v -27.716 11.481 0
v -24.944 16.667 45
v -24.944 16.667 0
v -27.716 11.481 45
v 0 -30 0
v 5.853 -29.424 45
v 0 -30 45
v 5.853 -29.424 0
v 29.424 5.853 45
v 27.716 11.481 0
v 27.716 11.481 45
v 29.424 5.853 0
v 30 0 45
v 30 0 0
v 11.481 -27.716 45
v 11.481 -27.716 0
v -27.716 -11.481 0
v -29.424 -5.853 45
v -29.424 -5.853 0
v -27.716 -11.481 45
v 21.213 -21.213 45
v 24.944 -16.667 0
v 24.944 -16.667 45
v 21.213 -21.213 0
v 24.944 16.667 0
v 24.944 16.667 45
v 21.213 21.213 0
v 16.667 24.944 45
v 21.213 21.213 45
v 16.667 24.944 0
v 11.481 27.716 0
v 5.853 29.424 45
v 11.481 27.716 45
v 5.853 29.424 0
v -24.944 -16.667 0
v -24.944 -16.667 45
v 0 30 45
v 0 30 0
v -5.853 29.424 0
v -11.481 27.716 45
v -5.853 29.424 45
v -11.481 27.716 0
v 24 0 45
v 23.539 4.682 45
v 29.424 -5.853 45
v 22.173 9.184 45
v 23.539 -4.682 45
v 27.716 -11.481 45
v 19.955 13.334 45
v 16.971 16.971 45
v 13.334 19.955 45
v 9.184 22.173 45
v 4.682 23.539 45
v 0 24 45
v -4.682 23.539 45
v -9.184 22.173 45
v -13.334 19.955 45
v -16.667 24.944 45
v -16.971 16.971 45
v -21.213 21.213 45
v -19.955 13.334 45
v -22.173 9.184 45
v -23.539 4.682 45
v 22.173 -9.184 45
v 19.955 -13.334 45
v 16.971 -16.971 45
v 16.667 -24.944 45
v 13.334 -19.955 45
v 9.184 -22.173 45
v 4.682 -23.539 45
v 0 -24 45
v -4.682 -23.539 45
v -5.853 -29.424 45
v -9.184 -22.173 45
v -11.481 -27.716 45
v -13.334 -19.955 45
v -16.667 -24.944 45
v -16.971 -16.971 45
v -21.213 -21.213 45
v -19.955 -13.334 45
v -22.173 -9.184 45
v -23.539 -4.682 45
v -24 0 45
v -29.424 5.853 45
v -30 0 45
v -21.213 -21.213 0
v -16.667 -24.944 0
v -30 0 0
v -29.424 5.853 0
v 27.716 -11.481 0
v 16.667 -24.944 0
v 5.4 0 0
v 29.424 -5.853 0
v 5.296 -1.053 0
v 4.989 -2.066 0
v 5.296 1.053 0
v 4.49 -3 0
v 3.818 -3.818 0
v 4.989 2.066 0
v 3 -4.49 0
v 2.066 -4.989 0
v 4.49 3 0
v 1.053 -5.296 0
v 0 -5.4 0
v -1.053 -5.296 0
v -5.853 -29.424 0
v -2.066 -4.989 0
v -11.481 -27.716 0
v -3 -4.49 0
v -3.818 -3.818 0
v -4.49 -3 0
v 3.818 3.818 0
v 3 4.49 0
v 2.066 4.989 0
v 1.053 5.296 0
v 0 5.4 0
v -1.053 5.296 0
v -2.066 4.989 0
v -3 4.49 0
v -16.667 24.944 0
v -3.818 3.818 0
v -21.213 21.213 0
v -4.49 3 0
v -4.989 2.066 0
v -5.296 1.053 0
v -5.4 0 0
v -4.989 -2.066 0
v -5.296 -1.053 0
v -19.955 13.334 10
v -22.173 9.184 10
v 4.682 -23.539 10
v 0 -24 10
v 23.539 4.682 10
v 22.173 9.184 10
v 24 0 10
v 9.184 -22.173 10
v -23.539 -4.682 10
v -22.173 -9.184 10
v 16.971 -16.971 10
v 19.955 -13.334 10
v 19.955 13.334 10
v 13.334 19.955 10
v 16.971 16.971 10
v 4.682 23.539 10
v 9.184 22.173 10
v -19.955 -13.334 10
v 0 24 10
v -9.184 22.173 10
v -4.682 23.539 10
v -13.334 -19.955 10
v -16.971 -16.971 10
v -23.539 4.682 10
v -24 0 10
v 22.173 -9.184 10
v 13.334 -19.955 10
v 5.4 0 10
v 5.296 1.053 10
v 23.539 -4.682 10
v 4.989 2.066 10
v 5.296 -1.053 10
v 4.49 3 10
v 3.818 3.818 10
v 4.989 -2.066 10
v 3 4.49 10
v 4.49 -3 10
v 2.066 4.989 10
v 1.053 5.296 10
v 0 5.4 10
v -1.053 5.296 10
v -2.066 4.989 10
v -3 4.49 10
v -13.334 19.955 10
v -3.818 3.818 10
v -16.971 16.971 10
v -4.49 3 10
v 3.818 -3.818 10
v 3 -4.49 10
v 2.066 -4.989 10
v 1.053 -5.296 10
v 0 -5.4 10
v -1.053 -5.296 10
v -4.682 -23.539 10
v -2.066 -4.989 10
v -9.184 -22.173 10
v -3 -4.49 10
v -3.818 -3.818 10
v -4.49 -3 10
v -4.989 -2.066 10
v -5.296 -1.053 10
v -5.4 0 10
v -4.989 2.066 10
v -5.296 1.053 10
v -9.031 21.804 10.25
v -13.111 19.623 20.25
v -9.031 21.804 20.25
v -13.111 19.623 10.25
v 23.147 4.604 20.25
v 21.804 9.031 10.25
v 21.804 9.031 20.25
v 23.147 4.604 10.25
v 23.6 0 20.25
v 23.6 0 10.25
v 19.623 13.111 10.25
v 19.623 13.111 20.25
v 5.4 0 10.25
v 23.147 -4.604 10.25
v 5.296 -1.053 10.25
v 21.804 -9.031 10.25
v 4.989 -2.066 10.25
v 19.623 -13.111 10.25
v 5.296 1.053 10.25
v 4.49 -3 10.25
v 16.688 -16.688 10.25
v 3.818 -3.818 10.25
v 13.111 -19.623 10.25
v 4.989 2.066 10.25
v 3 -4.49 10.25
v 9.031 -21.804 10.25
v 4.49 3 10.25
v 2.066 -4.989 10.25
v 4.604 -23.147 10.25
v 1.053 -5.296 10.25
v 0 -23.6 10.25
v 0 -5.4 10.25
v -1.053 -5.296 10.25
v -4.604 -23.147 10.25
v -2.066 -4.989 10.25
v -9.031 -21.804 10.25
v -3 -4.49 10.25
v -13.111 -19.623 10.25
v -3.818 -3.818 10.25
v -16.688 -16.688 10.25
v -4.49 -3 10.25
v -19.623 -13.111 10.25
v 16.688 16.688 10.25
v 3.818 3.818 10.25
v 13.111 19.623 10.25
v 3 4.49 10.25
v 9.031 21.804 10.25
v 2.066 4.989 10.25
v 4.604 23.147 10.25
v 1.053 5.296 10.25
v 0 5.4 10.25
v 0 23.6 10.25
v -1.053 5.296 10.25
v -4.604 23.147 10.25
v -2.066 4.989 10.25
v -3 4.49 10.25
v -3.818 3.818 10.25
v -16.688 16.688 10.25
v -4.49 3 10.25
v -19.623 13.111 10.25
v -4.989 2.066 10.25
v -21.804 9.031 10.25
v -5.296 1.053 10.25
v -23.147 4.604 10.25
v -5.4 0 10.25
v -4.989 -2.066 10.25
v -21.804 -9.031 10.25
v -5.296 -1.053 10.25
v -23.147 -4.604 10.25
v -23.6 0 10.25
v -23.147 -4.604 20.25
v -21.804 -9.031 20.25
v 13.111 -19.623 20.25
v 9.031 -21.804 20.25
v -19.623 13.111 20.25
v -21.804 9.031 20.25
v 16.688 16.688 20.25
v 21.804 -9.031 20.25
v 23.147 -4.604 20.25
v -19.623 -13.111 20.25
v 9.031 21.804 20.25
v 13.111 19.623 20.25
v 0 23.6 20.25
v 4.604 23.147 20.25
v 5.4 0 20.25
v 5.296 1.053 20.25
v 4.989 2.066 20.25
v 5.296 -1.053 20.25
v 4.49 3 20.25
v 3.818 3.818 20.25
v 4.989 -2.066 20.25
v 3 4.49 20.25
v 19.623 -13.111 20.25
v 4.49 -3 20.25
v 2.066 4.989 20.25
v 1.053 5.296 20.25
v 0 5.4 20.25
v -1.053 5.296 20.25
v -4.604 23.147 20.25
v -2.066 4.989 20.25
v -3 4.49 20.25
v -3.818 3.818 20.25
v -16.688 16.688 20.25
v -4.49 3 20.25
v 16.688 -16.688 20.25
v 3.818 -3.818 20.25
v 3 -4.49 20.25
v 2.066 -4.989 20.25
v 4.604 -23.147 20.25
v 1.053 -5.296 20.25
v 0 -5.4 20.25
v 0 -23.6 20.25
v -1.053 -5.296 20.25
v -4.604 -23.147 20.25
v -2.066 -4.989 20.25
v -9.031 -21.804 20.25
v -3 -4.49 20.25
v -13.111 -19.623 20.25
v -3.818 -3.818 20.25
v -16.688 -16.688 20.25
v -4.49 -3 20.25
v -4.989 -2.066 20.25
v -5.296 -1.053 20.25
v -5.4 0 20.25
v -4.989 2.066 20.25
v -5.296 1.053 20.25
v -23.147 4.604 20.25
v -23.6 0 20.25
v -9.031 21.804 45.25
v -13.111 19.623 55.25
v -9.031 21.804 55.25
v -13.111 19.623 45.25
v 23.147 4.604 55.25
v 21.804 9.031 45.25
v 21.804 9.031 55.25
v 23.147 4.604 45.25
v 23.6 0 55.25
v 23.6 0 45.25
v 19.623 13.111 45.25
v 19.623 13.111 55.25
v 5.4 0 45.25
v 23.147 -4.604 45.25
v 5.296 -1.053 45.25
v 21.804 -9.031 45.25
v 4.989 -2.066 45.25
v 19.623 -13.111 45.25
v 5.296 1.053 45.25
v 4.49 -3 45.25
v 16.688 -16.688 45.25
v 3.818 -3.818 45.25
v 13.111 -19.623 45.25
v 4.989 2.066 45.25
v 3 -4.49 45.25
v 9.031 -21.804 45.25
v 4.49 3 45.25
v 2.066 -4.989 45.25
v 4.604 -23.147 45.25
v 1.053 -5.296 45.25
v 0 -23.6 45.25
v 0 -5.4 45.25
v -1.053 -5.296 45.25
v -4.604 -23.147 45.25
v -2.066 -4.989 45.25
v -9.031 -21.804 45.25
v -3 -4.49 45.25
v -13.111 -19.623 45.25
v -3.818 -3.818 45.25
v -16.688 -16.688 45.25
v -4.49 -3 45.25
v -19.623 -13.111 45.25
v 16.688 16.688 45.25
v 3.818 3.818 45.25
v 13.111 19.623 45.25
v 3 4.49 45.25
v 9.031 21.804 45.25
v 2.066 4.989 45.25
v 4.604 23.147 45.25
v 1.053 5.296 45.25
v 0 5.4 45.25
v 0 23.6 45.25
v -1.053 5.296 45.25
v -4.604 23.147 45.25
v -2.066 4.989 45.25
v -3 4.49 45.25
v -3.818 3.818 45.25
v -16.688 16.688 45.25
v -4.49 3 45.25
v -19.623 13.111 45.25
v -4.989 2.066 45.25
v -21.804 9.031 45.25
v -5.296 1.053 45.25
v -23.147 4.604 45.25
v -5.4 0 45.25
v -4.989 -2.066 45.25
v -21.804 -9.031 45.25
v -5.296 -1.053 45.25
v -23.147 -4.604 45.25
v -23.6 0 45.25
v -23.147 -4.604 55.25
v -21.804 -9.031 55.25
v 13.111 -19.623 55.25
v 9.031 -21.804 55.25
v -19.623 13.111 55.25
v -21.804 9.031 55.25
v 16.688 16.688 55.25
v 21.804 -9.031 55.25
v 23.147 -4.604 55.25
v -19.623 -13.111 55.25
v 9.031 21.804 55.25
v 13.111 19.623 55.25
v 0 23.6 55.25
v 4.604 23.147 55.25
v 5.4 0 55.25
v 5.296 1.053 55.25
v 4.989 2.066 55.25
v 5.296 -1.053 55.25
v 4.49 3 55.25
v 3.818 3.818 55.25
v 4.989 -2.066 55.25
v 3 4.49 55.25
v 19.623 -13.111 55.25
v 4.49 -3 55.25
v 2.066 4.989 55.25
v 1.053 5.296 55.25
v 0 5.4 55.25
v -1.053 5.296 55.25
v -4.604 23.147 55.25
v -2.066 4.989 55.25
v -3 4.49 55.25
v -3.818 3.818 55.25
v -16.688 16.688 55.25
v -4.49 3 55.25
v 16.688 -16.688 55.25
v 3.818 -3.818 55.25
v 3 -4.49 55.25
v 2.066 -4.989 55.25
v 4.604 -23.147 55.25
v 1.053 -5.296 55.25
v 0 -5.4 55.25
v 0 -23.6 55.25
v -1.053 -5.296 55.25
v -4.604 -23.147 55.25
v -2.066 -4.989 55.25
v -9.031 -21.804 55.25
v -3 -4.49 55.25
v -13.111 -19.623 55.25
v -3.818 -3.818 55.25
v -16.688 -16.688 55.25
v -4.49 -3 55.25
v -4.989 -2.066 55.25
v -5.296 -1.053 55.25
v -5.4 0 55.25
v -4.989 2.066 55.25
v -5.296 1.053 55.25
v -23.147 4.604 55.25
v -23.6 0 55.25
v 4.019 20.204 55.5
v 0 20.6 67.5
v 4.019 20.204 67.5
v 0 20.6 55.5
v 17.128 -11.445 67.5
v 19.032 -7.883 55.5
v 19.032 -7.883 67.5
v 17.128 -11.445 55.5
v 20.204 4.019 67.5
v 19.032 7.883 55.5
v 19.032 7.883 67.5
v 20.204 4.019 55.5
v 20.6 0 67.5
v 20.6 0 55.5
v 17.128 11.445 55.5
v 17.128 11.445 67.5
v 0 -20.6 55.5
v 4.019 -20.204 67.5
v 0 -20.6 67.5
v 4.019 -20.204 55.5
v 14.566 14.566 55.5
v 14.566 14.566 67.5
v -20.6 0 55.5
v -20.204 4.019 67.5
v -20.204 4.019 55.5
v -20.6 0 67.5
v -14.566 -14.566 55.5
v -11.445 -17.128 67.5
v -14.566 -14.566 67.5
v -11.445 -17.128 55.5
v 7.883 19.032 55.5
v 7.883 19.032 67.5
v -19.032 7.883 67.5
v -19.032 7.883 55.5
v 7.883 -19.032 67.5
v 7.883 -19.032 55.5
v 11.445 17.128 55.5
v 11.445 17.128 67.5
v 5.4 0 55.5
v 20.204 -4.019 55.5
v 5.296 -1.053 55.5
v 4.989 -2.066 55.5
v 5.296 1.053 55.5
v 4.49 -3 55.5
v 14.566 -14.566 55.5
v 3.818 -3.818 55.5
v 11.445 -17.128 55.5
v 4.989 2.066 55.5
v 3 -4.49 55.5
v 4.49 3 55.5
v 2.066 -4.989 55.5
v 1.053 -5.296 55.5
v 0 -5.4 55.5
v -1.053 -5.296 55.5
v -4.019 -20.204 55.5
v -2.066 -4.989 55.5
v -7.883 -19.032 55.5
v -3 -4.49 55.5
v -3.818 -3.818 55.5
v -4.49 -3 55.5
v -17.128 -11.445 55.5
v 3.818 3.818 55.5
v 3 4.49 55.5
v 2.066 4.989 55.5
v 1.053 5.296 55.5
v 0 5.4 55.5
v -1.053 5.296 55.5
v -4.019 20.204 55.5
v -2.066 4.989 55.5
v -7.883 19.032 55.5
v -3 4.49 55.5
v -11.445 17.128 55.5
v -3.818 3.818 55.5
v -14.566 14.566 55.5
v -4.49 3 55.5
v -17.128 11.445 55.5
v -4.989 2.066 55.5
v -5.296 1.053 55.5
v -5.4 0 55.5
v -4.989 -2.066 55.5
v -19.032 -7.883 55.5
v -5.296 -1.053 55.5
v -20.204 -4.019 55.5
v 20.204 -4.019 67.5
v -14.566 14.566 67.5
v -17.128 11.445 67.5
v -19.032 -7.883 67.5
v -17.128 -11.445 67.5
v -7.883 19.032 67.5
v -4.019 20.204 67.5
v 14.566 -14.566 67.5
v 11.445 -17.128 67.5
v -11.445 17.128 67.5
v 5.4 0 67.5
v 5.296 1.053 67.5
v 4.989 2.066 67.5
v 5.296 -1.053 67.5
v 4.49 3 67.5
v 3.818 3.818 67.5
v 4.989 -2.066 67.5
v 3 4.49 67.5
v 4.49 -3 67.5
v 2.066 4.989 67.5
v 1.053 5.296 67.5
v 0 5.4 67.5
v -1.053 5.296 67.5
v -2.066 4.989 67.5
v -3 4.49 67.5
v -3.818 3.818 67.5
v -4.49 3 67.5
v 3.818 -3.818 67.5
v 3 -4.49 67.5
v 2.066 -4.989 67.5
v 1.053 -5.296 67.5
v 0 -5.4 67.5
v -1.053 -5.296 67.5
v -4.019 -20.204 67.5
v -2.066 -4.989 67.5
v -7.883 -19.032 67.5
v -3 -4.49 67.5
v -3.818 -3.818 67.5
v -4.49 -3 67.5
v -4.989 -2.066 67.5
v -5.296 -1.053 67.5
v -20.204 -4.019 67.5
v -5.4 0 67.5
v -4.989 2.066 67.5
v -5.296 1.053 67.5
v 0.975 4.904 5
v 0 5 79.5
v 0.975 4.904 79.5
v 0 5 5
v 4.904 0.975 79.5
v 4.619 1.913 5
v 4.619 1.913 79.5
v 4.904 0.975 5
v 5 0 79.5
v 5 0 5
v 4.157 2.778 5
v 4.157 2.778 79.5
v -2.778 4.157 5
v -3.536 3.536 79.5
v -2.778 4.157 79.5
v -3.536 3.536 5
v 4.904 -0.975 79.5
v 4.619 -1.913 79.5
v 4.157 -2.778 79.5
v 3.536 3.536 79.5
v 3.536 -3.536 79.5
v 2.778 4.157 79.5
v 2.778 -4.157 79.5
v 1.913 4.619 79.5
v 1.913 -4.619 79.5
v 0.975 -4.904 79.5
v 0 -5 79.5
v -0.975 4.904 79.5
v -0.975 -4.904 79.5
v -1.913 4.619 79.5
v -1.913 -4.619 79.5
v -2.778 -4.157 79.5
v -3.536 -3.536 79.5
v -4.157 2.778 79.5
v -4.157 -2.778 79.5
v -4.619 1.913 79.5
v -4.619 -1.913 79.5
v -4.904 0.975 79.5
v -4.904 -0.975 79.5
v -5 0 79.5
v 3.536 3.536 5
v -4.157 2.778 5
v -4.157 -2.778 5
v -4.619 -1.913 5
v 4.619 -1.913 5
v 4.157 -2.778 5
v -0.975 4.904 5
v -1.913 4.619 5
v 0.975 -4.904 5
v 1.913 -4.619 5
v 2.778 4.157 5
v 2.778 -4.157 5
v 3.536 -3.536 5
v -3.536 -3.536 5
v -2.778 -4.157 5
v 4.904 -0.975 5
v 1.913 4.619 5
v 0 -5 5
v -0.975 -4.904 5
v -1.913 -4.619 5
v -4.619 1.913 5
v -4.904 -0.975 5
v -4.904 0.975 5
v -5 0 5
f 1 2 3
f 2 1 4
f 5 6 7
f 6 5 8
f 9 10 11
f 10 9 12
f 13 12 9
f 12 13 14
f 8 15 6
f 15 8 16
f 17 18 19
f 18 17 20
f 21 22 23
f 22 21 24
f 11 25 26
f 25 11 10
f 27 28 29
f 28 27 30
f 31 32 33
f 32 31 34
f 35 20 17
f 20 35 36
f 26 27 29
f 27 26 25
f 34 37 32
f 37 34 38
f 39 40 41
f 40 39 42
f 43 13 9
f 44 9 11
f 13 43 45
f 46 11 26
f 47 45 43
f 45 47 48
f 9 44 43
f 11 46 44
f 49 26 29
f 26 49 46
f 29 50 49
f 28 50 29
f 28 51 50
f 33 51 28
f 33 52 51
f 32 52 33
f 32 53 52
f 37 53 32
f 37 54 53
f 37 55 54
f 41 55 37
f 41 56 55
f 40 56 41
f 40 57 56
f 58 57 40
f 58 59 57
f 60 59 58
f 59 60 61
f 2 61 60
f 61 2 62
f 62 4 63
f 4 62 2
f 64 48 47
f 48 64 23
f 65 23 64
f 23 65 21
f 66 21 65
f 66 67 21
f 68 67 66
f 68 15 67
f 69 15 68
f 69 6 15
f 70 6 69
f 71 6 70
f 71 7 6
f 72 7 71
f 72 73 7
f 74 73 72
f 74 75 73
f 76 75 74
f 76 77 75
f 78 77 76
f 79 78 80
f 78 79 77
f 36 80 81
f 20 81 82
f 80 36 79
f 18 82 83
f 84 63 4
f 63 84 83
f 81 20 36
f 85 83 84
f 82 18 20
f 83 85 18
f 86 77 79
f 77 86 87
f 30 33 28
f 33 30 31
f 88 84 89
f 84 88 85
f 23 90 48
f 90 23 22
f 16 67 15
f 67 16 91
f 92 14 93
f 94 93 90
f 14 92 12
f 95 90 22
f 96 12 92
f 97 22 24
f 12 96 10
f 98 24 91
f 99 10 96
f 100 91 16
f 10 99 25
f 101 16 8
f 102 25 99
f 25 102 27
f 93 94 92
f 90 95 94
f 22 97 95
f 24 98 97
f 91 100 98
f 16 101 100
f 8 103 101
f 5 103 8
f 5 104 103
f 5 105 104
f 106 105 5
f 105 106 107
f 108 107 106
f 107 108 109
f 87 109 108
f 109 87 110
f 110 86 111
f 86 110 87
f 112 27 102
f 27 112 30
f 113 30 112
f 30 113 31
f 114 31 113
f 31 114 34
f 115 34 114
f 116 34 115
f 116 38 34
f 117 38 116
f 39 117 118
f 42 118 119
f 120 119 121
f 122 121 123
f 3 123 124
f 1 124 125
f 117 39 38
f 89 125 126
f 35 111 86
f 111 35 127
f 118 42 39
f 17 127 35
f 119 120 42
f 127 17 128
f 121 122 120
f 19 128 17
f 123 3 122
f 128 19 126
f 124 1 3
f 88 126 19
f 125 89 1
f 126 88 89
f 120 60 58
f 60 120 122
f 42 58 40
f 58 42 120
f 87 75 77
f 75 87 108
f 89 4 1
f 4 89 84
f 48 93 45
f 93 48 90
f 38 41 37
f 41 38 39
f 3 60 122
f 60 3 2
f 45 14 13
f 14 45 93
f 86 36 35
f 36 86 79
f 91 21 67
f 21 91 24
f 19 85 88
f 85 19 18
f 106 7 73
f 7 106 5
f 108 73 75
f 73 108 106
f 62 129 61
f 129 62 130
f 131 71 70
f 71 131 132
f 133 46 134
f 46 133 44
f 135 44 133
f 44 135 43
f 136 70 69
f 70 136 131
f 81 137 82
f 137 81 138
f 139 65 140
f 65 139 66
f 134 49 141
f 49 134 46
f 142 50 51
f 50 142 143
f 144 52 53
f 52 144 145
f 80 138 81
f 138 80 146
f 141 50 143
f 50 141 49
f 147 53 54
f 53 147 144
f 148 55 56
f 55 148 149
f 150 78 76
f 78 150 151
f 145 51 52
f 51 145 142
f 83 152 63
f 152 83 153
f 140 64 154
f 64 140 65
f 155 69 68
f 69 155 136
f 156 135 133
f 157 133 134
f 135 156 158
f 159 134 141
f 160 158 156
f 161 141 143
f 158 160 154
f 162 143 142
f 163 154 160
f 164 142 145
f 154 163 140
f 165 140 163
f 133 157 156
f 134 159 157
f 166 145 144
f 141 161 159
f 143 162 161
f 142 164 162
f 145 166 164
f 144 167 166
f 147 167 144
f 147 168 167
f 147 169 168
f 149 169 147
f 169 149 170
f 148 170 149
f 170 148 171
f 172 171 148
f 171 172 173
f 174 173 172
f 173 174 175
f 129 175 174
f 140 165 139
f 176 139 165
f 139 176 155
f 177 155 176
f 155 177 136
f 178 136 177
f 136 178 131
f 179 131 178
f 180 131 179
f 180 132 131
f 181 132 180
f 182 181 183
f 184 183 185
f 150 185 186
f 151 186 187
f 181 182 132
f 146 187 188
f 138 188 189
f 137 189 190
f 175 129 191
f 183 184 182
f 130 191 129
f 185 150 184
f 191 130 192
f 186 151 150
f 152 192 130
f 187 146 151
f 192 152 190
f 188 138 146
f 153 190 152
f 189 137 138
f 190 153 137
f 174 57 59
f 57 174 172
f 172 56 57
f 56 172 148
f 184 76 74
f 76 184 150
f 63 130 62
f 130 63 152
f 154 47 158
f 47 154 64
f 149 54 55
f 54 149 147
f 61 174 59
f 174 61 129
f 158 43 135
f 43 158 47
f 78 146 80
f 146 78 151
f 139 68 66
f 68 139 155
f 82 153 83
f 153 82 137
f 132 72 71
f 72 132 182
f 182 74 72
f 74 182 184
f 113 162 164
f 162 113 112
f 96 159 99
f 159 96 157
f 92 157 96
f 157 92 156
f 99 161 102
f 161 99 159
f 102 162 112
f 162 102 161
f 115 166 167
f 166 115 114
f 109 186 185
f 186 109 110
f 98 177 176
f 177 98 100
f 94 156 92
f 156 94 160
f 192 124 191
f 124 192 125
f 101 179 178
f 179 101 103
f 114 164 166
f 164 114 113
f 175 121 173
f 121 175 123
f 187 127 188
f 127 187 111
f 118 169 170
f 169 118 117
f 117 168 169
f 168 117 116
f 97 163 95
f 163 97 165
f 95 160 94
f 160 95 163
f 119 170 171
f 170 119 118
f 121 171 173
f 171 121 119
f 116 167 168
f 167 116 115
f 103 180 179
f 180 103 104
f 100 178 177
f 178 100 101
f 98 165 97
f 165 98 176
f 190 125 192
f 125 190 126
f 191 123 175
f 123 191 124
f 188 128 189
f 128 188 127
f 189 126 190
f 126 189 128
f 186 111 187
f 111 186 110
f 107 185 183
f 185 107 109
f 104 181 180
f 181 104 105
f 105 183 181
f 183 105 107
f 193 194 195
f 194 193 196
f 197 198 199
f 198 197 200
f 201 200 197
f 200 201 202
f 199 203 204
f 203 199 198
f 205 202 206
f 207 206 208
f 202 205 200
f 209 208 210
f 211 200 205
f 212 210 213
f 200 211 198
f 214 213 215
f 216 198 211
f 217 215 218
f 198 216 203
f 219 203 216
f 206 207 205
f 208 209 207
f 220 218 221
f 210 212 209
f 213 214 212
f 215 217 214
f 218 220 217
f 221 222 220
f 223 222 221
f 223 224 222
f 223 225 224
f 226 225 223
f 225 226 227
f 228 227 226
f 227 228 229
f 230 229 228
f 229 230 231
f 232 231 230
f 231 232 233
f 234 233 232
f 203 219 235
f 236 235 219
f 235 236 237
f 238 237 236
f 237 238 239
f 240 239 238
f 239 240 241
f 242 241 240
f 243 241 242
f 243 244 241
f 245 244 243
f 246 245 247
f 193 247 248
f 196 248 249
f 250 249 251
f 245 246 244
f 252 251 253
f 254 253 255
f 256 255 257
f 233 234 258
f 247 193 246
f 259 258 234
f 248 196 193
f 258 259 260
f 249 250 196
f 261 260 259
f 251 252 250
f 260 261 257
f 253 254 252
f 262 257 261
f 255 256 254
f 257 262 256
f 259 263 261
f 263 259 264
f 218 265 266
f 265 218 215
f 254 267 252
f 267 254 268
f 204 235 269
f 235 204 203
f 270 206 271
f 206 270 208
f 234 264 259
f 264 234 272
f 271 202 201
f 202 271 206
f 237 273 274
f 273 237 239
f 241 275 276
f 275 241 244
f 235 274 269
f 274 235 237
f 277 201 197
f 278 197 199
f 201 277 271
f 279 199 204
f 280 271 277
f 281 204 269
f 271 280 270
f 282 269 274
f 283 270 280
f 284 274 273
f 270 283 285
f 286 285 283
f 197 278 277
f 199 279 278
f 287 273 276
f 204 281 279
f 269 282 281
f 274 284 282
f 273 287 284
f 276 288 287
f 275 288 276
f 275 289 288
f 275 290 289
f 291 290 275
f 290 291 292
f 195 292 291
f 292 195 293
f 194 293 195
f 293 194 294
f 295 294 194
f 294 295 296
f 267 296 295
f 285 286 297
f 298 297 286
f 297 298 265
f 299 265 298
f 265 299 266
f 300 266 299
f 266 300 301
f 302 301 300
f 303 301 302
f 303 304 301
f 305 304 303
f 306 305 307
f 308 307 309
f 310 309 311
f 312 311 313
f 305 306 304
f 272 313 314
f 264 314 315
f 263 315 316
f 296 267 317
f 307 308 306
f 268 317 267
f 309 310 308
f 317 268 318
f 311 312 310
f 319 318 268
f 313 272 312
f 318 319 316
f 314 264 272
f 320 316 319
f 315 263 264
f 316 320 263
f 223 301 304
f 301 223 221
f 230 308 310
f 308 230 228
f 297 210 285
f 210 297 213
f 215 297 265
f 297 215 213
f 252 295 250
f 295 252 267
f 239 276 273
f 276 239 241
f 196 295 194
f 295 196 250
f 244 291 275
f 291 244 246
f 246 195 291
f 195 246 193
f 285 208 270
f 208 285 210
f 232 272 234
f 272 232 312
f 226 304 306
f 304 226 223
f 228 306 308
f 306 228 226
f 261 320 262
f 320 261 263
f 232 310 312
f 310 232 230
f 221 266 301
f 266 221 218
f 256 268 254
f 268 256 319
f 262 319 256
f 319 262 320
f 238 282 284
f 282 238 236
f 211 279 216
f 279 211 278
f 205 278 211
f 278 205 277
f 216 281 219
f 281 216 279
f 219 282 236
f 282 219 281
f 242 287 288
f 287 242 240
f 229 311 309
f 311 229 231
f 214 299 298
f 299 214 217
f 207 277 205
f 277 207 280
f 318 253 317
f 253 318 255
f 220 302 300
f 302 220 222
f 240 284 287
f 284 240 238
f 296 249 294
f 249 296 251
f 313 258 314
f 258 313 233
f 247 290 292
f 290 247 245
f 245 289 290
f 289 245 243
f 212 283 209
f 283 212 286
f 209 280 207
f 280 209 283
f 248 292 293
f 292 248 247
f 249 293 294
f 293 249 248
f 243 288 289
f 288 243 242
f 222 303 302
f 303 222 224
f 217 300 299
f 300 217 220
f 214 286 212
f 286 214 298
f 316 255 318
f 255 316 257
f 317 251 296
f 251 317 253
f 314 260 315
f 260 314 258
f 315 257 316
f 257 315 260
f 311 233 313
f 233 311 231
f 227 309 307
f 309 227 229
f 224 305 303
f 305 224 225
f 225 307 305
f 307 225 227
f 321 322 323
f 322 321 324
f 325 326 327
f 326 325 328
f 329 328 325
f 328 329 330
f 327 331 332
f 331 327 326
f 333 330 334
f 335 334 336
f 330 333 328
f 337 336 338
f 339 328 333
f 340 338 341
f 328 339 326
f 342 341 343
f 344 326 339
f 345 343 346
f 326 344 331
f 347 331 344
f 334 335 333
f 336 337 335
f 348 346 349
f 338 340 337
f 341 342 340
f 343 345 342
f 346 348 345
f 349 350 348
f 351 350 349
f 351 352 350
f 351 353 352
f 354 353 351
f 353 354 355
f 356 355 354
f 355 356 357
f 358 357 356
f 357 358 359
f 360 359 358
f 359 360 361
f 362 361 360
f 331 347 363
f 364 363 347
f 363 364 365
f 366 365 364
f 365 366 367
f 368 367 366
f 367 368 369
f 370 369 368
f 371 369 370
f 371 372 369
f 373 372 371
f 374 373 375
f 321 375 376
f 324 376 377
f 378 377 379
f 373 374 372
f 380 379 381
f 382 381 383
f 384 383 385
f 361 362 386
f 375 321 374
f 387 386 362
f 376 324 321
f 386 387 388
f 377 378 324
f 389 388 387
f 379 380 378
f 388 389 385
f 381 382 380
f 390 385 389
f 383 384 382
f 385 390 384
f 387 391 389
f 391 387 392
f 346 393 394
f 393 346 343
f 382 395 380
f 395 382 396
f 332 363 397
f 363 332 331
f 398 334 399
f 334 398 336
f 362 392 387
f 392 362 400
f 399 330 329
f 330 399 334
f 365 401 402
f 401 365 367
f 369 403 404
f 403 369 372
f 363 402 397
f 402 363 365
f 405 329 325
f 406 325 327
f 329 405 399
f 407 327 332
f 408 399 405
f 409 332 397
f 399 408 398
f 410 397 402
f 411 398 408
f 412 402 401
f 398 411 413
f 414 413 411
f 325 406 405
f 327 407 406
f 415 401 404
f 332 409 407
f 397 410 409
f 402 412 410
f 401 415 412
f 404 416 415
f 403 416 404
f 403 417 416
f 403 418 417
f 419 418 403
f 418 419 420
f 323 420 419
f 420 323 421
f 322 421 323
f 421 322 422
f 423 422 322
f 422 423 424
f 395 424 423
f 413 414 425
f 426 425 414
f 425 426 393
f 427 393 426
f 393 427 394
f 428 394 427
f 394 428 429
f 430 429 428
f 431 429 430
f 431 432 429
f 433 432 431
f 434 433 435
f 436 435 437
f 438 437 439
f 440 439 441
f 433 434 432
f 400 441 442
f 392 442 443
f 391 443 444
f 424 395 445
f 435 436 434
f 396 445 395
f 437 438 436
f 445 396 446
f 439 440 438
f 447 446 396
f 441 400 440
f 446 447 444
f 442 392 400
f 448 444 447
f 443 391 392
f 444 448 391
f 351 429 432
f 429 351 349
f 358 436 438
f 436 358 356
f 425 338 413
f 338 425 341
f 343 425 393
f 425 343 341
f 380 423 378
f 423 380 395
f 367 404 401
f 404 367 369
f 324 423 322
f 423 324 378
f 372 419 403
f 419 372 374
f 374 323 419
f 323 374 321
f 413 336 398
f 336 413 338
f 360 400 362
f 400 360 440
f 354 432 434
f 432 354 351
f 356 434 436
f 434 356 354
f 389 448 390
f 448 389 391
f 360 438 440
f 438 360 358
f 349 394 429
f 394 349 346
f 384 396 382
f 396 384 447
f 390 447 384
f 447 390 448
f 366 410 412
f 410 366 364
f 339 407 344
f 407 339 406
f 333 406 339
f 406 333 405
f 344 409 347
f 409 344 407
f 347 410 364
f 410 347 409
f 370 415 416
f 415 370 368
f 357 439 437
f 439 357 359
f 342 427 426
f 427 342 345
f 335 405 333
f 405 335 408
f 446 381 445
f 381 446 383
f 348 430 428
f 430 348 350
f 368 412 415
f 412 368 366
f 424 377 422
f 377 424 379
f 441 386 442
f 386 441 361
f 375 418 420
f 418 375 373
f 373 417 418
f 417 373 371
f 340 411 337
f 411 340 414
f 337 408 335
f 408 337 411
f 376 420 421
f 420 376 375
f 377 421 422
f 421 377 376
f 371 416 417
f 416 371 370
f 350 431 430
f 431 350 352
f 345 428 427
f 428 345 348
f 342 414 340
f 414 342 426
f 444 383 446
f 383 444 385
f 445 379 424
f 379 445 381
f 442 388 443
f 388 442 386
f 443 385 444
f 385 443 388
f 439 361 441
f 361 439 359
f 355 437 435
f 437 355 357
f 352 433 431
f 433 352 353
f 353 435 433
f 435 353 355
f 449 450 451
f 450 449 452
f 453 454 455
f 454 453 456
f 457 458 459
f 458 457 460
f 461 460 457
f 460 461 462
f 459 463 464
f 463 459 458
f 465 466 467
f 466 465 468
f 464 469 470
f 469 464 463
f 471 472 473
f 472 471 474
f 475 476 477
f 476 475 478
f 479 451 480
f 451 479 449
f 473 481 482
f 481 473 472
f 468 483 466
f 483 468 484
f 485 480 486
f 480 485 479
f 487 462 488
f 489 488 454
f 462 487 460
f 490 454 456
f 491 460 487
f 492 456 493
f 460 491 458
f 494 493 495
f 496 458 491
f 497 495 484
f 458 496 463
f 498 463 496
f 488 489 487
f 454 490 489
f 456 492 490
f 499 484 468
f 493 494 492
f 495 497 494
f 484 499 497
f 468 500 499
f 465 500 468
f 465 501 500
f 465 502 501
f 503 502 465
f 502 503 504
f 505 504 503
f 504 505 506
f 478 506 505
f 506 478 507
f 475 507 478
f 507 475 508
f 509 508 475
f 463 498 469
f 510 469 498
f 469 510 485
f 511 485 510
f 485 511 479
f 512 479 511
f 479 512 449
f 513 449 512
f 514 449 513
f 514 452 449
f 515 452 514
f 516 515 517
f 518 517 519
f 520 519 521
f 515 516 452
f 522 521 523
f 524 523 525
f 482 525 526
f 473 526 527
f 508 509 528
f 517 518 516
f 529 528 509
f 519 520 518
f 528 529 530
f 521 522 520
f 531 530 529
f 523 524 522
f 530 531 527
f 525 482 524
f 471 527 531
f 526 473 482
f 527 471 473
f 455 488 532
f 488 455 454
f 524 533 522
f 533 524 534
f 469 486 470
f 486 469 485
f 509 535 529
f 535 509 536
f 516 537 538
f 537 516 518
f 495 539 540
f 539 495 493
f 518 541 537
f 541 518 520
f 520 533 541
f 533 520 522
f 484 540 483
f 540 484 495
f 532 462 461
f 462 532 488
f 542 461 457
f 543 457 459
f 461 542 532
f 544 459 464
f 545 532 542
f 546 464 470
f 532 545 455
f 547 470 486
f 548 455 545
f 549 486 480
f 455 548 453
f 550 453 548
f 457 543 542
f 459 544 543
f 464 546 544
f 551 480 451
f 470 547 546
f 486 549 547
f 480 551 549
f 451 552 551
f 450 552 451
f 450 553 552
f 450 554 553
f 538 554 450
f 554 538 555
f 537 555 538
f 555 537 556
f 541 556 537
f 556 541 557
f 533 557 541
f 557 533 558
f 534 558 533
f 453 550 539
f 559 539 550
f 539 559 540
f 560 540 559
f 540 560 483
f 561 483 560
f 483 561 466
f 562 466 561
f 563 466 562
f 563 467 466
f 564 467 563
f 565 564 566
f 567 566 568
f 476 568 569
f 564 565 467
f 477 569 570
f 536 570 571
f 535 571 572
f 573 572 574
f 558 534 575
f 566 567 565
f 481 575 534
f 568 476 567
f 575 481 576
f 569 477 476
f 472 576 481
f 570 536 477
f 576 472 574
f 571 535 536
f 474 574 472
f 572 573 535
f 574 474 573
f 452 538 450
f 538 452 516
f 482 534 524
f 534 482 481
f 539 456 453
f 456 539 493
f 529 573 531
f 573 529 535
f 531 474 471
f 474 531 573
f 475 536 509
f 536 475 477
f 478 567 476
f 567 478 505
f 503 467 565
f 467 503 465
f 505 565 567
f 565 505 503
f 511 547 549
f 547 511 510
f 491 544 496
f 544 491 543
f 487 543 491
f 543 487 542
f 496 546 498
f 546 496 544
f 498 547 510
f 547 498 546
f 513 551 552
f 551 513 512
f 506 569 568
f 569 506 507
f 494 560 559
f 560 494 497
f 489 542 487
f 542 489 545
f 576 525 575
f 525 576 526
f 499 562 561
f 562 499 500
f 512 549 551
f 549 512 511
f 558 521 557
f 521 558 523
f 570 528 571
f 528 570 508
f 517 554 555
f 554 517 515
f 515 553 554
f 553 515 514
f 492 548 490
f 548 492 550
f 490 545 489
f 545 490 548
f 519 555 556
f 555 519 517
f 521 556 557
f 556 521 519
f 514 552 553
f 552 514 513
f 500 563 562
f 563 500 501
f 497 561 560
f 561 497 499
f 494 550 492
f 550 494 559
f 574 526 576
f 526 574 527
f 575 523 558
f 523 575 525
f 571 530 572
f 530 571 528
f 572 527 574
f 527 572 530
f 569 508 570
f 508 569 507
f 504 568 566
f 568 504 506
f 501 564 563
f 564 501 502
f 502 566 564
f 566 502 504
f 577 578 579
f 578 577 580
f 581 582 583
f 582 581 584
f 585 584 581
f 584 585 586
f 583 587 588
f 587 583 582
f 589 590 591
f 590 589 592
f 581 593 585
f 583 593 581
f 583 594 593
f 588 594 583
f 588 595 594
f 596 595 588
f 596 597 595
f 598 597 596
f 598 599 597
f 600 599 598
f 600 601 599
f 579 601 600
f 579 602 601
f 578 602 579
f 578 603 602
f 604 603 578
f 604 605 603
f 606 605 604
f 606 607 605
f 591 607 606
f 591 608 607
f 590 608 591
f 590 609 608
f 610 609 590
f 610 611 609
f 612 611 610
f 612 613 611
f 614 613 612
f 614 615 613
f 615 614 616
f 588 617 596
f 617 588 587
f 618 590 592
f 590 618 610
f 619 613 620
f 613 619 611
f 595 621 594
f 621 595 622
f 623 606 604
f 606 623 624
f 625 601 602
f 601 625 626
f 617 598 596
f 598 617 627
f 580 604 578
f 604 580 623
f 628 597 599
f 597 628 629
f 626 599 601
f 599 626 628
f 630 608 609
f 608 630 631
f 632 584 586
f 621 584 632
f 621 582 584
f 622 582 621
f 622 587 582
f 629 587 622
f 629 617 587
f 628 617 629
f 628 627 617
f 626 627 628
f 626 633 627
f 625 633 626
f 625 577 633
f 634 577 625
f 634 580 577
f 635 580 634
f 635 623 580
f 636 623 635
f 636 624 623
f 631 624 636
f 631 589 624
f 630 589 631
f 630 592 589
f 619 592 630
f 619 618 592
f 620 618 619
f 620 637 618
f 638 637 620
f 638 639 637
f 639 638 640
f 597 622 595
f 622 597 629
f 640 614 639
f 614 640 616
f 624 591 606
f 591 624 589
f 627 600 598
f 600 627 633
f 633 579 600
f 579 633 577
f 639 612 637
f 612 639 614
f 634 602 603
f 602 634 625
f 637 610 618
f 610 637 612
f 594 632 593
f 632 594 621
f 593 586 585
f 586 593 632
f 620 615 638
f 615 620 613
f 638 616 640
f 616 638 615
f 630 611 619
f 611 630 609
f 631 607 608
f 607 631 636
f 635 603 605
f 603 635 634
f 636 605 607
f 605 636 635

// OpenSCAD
$fn = 32;

// ------------------------------------------------------------------------
// Bearing housing: housing d60, two bearings and a shaft
// Every part is its own module, assembly() places them once.
// ------------------------------------------------------------------------

// --- part 1 ---
module housing() {
  difference() {
    cylinder(h = 45, d = 60);
    translate([0, 0, 10]) cylinder(h = 36, d = 48);
    translate([0, 0, -1]) cylinder(h = 12, d = 10.8);
  }
}

// --- part 2 ---
module bearing_lower() {
  difference() {
      translate([0, 0, 0]) cylinder(h = 10, d = 47.2);
      translate([0, 0, -1]) cylinder(h = 12, d = 10.8);
    }
}

// --- part 3 ---
module bearing_upper() {
  difference() {
      translate([0, 0, 0]) cylinder(h = 10, d = 47.2);
      translate([0, 0, -1]) cylinder(h = 12, d = 10.8);
    }
}

// --- part 4 ---
module spacer() {
  difference() {
      translate([0, 0, 0]) cylinder(h = 12, d = 41.2);
      translate([0, 0, -1]) cylinder(h = 14, d = 10.8);
    }
}

// --- part 5 ---
module shaft() {
  translate([0, 0, -37.25]) cylinder(h = 74.5, d = 10);
}

// --- assembly ---
module assembly() {
  translate([0, 0, 0]) rotate([0, 0, 0]) housing();
  translate([0, 0, 10.25]) rotate([0, 0, 0]) bearing_lower();
  translate([0, 0, 45.25]) rotate([0, 0, 0]) bearing_upper();
  translate([0, 0, 55.5]) rotate([0, 0, 0]) spacer();
  translate([0, 0, 42.25]) rotate([0, 0, 0]) shaft();
}

assembly();
